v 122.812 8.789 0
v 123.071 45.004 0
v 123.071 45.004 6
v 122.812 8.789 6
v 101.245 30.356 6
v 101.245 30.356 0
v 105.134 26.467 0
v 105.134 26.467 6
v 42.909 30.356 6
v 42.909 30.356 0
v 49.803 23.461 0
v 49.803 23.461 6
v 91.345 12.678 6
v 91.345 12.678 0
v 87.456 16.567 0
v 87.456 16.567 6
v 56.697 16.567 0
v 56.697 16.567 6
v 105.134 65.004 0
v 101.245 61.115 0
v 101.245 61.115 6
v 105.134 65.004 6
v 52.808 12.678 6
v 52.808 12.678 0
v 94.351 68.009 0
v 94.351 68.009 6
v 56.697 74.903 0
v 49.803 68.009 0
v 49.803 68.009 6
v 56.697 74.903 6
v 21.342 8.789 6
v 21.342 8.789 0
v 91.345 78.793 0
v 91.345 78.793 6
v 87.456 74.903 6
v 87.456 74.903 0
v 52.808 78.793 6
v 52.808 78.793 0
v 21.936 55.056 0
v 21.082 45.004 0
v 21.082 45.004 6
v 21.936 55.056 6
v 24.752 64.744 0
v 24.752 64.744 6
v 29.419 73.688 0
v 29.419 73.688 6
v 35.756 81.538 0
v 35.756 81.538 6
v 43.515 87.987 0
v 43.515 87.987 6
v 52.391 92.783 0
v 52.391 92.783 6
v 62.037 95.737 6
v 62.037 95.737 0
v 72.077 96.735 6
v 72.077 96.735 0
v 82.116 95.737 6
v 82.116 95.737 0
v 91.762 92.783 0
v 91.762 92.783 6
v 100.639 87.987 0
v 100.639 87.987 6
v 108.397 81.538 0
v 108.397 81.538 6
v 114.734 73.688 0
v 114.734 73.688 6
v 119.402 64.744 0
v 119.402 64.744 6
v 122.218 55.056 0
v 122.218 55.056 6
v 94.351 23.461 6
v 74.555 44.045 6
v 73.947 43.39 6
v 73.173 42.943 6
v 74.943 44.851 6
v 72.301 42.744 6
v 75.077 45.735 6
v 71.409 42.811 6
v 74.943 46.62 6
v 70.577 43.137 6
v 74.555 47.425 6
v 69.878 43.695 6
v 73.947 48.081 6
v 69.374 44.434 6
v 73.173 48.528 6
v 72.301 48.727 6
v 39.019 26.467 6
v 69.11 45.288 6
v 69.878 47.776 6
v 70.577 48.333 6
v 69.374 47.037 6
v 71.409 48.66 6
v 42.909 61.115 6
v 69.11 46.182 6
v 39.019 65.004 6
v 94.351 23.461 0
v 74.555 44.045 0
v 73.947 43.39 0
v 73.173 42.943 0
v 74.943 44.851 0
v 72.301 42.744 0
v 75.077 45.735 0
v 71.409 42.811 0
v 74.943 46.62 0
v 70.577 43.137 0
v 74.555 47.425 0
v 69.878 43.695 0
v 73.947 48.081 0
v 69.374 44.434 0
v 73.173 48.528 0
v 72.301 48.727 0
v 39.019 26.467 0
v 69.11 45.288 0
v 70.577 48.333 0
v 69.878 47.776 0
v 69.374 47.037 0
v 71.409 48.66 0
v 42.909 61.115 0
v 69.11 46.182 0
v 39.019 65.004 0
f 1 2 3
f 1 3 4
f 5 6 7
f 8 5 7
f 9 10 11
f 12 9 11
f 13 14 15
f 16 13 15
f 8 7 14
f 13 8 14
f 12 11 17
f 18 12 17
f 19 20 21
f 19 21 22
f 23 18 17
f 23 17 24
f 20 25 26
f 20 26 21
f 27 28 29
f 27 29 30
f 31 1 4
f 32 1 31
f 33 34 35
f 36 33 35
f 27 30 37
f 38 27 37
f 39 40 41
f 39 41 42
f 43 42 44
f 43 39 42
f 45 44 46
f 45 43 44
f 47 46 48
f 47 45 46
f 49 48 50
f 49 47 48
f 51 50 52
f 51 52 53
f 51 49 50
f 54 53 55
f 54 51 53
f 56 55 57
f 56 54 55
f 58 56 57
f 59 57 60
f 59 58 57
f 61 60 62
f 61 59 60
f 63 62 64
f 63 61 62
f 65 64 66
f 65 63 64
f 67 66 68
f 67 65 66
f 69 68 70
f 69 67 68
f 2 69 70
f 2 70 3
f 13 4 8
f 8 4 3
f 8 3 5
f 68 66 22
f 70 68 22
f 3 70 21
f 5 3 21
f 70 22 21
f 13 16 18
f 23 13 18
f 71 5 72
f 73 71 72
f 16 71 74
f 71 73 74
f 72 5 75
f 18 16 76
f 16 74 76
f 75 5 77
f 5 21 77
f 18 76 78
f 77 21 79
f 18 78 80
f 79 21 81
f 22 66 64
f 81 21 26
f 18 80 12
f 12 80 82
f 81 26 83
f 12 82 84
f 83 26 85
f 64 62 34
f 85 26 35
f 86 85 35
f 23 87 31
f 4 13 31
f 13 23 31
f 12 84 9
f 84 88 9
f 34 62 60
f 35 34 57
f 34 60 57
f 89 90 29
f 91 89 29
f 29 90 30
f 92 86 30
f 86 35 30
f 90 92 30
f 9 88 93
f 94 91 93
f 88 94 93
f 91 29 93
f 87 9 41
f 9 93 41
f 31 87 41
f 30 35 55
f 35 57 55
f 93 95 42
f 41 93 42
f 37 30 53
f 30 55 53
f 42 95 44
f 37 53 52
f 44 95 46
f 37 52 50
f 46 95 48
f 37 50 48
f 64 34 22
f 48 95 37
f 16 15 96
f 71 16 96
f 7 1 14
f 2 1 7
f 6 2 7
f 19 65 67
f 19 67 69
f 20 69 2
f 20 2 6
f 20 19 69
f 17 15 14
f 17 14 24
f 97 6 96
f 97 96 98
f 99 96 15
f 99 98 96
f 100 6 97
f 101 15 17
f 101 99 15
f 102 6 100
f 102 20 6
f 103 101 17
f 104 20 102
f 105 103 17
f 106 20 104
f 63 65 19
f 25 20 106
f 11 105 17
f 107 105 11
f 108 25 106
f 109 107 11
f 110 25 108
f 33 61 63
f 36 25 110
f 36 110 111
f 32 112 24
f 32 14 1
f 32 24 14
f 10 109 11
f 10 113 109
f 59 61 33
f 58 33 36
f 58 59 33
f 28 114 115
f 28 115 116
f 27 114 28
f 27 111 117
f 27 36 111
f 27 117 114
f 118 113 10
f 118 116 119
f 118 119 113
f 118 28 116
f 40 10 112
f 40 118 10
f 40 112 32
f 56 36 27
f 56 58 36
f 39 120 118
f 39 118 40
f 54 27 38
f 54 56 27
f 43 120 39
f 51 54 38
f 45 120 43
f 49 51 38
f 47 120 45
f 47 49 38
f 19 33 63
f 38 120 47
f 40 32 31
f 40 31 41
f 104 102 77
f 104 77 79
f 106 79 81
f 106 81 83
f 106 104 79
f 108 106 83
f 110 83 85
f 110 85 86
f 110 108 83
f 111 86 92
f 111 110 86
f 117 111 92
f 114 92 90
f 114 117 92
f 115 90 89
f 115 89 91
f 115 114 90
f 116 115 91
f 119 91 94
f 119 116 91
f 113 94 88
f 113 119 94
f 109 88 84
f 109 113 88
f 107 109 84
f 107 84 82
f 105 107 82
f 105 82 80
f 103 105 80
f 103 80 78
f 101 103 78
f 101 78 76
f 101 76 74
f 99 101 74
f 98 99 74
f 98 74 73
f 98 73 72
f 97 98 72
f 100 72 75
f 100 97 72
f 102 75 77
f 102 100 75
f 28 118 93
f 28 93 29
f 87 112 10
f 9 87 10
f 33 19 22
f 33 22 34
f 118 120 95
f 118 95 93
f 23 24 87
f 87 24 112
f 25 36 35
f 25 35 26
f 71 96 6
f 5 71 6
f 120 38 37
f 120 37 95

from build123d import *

# Parameters (mm, degrees)
MODEL_R             = 3
BOSS_EXTRUDE1_DEPTH = 6


with BuildPart() as part:
    # Model → Boss-Extrude1 (new body)
    with BuildSketch(Plane.XY):
        with BuildLine():
            Line((122.81162835, 8.788979227), (21.34180525, 8.788979227))
            Line((21.34180525, 8.788979227), (21.081967495, 45.003500256))
            ThreePointArc((21.081967495, 45.003500256), (72.0767168, 96.735308544), (123.071466105, 45.003500256))
            Line((123.071466105, 45.003500256), (122.81162835, 8.788979227))
        make_face()
        with Locations((72.0767168, 45.735308544)):
            Circle(MODEL_R, mode=Mode.SUBTRACT)
        Polygon((49.802853193, 68.009172151), (56.697144309, 74.903463268), (52.808057013, 78.792550564), (39.01947478, 65.003968331), (42.908562076, 61.114881035), align=None, mode=Mode.SUBTRACT)
        Polygon((49.802853193, 23.461444937), (56.697144309, 16.56715382), (52.808057013, 12.678066524), (39.01947478, 26.466648757), (42.908562076, 30.355736053), align=None, mode=Mode.SUBTRACT)
        Polygon((94.350580407, 68.009172151), (101.244871524, 61.114881035), (105.13395882, 65.003968331), (91.345376587, 78.792550564), (87.456289291, 74.903463268), align=None, mode=Mode.SUBTRACT)
        Polygon((94.350580407, 23.461444937), (101.244871524, 30.355736053), (105.13395882, 26.466648757), (91.345376587, 12.678066524), (87.456289291, 16.56715382), align=None, mode=Mode.SUBTRACT)
    extrude(amount=BOSS_EXTRUDE1_DEPTH)


solid = part.part
